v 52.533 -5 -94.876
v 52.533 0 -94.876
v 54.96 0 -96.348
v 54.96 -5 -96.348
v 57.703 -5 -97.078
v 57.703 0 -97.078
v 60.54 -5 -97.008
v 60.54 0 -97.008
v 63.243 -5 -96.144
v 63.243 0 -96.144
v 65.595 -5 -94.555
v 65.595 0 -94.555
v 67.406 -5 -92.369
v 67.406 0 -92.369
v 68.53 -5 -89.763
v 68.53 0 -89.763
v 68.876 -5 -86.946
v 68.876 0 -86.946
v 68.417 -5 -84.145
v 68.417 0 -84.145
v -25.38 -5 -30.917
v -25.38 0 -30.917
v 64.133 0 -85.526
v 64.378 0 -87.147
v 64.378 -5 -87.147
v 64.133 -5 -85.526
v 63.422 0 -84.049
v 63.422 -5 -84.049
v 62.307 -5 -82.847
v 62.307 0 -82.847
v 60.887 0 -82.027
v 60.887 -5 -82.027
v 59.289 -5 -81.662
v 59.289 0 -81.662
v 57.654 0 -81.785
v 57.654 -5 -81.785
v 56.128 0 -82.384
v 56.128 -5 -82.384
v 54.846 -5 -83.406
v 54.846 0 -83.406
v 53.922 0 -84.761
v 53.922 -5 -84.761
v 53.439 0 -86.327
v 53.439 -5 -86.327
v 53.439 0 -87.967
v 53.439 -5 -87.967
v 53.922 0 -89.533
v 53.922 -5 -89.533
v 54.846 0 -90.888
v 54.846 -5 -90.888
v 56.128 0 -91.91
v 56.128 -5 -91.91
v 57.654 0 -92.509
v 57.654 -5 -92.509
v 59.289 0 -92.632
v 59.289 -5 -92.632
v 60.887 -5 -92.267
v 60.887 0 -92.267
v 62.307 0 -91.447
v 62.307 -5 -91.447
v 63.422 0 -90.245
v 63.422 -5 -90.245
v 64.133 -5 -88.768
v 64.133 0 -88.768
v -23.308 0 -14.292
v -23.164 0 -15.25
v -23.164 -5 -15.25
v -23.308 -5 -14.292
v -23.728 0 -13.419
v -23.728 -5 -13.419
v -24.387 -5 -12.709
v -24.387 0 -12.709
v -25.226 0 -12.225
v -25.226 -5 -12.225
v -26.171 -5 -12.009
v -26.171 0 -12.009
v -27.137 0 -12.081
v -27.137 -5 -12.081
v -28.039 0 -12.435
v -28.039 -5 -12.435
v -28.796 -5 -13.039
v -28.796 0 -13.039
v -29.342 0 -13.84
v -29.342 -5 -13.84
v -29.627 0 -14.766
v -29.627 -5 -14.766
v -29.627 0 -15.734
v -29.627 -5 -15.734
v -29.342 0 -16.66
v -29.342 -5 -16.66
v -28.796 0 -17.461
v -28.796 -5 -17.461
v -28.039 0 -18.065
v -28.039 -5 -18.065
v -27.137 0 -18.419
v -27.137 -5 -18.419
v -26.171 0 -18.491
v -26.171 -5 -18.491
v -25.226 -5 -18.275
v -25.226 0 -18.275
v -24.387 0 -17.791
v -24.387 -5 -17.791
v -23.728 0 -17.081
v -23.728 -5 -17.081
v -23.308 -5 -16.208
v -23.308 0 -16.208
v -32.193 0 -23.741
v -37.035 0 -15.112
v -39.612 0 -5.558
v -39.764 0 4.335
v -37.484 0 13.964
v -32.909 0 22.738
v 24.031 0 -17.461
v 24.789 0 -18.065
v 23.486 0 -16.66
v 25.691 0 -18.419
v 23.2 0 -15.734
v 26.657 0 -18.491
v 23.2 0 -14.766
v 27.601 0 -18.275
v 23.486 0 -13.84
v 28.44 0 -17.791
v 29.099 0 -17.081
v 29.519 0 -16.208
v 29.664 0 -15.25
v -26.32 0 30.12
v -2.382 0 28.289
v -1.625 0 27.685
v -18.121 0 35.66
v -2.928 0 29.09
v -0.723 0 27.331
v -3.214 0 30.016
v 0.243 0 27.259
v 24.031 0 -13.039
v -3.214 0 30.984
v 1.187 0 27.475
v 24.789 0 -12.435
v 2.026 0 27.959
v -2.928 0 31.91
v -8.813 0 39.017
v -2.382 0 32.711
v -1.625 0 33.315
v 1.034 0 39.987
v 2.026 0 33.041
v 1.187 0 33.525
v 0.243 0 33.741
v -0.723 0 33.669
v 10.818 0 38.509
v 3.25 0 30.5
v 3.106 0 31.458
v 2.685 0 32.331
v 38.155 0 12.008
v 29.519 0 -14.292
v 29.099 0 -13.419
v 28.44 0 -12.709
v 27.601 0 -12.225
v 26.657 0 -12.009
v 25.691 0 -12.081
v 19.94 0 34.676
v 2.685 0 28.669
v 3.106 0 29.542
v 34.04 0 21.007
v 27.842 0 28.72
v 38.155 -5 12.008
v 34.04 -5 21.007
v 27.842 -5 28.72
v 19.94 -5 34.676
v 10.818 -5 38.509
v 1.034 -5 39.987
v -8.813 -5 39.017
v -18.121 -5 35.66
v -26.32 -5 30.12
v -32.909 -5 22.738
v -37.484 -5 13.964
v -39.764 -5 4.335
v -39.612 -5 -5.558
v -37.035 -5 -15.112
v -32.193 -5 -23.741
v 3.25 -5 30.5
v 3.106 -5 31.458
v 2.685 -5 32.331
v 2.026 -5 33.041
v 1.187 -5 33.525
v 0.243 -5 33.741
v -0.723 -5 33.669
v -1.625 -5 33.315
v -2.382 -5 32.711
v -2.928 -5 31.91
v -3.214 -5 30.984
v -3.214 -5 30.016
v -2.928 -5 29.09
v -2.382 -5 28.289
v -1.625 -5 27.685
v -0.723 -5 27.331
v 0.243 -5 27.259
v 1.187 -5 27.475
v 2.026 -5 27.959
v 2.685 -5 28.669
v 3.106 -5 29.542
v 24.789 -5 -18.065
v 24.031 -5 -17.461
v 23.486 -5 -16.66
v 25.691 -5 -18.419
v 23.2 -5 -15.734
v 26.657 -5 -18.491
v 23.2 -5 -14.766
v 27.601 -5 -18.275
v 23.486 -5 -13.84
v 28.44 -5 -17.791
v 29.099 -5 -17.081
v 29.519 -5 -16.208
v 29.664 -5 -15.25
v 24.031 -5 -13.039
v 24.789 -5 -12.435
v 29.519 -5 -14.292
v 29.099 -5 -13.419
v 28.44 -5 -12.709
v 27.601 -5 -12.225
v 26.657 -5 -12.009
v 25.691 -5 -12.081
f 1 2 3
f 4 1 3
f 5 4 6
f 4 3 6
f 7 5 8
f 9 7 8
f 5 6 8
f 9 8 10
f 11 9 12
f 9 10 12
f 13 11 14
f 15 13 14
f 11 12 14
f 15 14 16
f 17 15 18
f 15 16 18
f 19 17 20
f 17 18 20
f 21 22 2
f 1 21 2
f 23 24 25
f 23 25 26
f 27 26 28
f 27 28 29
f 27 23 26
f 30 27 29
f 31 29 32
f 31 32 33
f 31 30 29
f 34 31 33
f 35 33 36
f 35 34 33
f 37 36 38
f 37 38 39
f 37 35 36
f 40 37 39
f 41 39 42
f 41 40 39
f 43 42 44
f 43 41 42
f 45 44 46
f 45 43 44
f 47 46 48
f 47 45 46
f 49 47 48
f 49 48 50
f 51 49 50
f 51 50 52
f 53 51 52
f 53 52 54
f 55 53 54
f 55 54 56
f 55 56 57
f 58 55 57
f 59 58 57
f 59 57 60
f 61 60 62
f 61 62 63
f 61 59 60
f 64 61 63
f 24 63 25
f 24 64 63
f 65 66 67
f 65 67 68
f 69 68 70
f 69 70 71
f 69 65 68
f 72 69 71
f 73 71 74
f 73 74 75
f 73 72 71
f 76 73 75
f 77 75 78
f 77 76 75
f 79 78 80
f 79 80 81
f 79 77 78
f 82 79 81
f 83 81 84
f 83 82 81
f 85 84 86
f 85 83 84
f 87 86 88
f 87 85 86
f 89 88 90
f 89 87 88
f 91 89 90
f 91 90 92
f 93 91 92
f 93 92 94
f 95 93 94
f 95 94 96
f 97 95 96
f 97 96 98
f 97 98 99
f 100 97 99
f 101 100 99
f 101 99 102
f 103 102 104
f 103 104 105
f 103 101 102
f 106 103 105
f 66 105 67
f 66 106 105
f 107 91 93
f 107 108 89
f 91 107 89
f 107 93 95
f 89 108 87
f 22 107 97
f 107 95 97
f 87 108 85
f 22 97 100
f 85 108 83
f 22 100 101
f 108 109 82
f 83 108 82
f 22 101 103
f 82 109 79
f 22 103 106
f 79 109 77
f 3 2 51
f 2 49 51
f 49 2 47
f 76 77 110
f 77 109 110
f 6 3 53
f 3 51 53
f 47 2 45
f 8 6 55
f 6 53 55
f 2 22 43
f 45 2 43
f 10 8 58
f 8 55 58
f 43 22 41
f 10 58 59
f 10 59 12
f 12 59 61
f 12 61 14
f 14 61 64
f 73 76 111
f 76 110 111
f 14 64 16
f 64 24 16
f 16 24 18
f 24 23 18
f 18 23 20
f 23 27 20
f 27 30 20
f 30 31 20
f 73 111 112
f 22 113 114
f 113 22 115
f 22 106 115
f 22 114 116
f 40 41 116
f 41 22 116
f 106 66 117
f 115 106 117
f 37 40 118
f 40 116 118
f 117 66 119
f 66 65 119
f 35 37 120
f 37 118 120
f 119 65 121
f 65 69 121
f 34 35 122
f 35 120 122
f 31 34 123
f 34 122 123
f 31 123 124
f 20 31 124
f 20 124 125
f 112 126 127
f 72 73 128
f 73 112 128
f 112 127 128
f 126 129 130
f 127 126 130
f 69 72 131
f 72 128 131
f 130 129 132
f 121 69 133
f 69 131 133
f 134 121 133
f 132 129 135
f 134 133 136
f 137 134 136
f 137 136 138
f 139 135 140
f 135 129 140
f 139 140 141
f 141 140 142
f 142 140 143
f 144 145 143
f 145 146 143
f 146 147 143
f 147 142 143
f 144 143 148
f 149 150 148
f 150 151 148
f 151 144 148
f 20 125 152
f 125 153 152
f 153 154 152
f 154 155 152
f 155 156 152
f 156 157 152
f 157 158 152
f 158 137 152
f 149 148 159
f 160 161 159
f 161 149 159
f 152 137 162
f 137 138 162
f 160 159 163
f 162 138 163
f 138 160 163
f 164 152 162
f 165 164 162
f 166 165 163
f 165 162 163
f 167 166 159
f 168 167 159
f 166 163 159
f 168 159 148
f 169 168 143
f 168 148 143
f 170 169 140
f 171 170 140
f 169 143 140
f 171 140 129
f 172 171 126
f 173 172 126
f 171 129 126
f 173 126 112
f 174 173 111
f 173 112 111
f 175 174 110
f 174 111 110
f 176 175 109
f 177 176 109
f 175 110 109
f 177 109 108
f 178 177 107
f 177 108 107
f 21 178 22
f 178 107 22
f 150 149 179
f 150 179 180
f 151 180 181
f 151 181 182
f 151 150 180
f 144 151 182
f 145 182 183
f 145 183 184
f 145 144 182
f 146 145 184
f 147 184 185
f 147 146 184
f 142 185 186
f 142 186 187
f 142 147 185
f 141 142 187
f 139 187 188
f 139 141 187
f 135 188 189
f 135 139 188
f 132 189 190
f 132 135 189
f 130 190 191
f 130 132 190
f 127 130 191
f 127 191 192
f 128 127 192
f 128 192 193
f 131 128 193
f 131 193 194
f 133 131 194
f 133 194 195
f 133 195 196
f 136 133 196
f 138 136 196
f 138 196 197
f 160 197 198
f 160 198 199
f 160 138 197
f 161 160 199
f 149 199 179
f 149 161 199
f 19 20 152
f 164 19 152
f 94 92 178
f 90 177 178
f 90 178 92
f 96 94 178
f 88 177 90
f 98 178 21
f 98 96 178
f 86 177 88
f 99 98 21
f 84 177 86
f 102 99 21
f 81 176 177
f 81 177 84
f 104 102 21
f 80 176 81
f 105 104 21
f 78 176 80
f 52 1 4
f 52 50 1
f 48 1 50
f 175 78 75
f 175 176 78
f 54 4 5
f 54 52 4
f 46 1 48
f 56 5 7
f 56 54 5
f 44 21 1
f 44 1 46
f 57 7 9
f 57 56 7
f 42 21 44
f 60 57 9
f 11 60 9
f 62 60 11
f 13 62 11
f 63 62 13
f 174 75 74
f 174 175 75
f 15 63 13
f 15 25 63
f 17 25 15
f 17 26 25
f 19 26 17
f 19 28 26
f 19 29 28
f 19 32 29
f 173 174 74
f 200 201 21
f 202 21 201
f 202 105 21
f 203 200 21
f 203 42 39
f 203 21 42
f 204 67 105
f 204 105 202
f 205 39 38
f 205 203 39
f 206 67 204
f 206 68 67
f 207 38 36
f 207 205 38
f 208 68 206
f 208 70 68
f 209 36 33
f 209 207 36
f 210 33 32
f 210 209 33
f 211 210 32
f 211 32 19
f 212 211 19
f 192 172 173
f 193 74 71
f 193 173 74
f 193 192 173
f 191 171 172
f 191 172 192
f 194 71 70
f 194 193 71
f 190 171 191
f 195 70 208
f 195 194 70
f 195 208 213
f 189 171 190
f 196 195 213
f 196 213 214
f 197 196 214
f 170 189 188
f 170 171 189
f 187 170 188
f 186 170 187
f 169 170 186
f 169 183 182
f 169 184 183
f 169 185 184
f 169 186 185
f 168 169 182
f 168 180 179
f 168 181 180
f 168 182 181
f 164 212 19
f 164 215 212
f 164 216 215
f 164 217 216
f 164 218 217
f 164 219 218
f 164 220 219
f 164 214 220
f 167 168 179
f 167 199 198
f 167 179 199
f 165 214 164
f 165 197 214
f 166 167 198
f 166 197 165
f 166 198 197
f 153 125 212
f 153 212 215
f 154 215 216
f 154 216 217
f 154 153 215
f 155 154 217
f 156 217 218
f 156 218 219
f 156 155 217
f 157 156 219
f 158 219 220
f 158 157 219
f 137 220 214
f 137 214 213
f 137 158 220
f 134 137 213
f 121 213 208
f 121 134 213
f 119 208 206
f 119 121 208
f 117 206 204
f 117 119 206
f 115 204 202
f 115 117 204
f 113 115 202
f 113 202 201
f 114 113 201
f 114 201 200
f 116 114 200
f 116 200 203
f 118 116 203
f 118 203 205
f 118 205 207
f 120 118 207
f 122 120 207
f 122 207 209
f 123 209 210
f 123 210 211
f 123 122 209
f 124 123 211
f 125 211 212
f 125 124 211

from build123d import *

# Parameters (mm, degrees)
F0_R     = 5.5
F0_R_2   = 3.25
F1_DEPTH = 5


with BuildPart() as f1:
    # F0 (on Front) → F1 (new body)
    with BuildSketch(Plane.XZ):
        with BuildLine():
            Line((68.416541, -84.14495), (38.15498, 12.008228))
            ThreePointArc((38.15498, 12.008228), (-22.392908, 33.144497), (-25.379985, -30.916927))
            Line((-25.379985, -30.916927), (52.5328, -94.876239))
            ThreePointArc((52.5328, -94.876239), (64.476024, -95.433131), (68.416541, -84.14495))
        make_face()
        with Locations((58.877797, -87.147007)):
            Circle(F0_R, mode=Mode.SUBTRACT)
        with Locations((-26.413775, -15.25)):
            Circle(F0_R_2, mode=Mode.SUBTRACT)
        with Locations((0, 30.5)):
            Circle(F0_R_2, mode=Mode.SUBTRACT)
        with Locations((26.413775, -15.25)):
            Circle(F0_R_2, mode=Mode.SUBTRACT)
    extrude(amount=F1_DEPTH)


solid = f1.part
